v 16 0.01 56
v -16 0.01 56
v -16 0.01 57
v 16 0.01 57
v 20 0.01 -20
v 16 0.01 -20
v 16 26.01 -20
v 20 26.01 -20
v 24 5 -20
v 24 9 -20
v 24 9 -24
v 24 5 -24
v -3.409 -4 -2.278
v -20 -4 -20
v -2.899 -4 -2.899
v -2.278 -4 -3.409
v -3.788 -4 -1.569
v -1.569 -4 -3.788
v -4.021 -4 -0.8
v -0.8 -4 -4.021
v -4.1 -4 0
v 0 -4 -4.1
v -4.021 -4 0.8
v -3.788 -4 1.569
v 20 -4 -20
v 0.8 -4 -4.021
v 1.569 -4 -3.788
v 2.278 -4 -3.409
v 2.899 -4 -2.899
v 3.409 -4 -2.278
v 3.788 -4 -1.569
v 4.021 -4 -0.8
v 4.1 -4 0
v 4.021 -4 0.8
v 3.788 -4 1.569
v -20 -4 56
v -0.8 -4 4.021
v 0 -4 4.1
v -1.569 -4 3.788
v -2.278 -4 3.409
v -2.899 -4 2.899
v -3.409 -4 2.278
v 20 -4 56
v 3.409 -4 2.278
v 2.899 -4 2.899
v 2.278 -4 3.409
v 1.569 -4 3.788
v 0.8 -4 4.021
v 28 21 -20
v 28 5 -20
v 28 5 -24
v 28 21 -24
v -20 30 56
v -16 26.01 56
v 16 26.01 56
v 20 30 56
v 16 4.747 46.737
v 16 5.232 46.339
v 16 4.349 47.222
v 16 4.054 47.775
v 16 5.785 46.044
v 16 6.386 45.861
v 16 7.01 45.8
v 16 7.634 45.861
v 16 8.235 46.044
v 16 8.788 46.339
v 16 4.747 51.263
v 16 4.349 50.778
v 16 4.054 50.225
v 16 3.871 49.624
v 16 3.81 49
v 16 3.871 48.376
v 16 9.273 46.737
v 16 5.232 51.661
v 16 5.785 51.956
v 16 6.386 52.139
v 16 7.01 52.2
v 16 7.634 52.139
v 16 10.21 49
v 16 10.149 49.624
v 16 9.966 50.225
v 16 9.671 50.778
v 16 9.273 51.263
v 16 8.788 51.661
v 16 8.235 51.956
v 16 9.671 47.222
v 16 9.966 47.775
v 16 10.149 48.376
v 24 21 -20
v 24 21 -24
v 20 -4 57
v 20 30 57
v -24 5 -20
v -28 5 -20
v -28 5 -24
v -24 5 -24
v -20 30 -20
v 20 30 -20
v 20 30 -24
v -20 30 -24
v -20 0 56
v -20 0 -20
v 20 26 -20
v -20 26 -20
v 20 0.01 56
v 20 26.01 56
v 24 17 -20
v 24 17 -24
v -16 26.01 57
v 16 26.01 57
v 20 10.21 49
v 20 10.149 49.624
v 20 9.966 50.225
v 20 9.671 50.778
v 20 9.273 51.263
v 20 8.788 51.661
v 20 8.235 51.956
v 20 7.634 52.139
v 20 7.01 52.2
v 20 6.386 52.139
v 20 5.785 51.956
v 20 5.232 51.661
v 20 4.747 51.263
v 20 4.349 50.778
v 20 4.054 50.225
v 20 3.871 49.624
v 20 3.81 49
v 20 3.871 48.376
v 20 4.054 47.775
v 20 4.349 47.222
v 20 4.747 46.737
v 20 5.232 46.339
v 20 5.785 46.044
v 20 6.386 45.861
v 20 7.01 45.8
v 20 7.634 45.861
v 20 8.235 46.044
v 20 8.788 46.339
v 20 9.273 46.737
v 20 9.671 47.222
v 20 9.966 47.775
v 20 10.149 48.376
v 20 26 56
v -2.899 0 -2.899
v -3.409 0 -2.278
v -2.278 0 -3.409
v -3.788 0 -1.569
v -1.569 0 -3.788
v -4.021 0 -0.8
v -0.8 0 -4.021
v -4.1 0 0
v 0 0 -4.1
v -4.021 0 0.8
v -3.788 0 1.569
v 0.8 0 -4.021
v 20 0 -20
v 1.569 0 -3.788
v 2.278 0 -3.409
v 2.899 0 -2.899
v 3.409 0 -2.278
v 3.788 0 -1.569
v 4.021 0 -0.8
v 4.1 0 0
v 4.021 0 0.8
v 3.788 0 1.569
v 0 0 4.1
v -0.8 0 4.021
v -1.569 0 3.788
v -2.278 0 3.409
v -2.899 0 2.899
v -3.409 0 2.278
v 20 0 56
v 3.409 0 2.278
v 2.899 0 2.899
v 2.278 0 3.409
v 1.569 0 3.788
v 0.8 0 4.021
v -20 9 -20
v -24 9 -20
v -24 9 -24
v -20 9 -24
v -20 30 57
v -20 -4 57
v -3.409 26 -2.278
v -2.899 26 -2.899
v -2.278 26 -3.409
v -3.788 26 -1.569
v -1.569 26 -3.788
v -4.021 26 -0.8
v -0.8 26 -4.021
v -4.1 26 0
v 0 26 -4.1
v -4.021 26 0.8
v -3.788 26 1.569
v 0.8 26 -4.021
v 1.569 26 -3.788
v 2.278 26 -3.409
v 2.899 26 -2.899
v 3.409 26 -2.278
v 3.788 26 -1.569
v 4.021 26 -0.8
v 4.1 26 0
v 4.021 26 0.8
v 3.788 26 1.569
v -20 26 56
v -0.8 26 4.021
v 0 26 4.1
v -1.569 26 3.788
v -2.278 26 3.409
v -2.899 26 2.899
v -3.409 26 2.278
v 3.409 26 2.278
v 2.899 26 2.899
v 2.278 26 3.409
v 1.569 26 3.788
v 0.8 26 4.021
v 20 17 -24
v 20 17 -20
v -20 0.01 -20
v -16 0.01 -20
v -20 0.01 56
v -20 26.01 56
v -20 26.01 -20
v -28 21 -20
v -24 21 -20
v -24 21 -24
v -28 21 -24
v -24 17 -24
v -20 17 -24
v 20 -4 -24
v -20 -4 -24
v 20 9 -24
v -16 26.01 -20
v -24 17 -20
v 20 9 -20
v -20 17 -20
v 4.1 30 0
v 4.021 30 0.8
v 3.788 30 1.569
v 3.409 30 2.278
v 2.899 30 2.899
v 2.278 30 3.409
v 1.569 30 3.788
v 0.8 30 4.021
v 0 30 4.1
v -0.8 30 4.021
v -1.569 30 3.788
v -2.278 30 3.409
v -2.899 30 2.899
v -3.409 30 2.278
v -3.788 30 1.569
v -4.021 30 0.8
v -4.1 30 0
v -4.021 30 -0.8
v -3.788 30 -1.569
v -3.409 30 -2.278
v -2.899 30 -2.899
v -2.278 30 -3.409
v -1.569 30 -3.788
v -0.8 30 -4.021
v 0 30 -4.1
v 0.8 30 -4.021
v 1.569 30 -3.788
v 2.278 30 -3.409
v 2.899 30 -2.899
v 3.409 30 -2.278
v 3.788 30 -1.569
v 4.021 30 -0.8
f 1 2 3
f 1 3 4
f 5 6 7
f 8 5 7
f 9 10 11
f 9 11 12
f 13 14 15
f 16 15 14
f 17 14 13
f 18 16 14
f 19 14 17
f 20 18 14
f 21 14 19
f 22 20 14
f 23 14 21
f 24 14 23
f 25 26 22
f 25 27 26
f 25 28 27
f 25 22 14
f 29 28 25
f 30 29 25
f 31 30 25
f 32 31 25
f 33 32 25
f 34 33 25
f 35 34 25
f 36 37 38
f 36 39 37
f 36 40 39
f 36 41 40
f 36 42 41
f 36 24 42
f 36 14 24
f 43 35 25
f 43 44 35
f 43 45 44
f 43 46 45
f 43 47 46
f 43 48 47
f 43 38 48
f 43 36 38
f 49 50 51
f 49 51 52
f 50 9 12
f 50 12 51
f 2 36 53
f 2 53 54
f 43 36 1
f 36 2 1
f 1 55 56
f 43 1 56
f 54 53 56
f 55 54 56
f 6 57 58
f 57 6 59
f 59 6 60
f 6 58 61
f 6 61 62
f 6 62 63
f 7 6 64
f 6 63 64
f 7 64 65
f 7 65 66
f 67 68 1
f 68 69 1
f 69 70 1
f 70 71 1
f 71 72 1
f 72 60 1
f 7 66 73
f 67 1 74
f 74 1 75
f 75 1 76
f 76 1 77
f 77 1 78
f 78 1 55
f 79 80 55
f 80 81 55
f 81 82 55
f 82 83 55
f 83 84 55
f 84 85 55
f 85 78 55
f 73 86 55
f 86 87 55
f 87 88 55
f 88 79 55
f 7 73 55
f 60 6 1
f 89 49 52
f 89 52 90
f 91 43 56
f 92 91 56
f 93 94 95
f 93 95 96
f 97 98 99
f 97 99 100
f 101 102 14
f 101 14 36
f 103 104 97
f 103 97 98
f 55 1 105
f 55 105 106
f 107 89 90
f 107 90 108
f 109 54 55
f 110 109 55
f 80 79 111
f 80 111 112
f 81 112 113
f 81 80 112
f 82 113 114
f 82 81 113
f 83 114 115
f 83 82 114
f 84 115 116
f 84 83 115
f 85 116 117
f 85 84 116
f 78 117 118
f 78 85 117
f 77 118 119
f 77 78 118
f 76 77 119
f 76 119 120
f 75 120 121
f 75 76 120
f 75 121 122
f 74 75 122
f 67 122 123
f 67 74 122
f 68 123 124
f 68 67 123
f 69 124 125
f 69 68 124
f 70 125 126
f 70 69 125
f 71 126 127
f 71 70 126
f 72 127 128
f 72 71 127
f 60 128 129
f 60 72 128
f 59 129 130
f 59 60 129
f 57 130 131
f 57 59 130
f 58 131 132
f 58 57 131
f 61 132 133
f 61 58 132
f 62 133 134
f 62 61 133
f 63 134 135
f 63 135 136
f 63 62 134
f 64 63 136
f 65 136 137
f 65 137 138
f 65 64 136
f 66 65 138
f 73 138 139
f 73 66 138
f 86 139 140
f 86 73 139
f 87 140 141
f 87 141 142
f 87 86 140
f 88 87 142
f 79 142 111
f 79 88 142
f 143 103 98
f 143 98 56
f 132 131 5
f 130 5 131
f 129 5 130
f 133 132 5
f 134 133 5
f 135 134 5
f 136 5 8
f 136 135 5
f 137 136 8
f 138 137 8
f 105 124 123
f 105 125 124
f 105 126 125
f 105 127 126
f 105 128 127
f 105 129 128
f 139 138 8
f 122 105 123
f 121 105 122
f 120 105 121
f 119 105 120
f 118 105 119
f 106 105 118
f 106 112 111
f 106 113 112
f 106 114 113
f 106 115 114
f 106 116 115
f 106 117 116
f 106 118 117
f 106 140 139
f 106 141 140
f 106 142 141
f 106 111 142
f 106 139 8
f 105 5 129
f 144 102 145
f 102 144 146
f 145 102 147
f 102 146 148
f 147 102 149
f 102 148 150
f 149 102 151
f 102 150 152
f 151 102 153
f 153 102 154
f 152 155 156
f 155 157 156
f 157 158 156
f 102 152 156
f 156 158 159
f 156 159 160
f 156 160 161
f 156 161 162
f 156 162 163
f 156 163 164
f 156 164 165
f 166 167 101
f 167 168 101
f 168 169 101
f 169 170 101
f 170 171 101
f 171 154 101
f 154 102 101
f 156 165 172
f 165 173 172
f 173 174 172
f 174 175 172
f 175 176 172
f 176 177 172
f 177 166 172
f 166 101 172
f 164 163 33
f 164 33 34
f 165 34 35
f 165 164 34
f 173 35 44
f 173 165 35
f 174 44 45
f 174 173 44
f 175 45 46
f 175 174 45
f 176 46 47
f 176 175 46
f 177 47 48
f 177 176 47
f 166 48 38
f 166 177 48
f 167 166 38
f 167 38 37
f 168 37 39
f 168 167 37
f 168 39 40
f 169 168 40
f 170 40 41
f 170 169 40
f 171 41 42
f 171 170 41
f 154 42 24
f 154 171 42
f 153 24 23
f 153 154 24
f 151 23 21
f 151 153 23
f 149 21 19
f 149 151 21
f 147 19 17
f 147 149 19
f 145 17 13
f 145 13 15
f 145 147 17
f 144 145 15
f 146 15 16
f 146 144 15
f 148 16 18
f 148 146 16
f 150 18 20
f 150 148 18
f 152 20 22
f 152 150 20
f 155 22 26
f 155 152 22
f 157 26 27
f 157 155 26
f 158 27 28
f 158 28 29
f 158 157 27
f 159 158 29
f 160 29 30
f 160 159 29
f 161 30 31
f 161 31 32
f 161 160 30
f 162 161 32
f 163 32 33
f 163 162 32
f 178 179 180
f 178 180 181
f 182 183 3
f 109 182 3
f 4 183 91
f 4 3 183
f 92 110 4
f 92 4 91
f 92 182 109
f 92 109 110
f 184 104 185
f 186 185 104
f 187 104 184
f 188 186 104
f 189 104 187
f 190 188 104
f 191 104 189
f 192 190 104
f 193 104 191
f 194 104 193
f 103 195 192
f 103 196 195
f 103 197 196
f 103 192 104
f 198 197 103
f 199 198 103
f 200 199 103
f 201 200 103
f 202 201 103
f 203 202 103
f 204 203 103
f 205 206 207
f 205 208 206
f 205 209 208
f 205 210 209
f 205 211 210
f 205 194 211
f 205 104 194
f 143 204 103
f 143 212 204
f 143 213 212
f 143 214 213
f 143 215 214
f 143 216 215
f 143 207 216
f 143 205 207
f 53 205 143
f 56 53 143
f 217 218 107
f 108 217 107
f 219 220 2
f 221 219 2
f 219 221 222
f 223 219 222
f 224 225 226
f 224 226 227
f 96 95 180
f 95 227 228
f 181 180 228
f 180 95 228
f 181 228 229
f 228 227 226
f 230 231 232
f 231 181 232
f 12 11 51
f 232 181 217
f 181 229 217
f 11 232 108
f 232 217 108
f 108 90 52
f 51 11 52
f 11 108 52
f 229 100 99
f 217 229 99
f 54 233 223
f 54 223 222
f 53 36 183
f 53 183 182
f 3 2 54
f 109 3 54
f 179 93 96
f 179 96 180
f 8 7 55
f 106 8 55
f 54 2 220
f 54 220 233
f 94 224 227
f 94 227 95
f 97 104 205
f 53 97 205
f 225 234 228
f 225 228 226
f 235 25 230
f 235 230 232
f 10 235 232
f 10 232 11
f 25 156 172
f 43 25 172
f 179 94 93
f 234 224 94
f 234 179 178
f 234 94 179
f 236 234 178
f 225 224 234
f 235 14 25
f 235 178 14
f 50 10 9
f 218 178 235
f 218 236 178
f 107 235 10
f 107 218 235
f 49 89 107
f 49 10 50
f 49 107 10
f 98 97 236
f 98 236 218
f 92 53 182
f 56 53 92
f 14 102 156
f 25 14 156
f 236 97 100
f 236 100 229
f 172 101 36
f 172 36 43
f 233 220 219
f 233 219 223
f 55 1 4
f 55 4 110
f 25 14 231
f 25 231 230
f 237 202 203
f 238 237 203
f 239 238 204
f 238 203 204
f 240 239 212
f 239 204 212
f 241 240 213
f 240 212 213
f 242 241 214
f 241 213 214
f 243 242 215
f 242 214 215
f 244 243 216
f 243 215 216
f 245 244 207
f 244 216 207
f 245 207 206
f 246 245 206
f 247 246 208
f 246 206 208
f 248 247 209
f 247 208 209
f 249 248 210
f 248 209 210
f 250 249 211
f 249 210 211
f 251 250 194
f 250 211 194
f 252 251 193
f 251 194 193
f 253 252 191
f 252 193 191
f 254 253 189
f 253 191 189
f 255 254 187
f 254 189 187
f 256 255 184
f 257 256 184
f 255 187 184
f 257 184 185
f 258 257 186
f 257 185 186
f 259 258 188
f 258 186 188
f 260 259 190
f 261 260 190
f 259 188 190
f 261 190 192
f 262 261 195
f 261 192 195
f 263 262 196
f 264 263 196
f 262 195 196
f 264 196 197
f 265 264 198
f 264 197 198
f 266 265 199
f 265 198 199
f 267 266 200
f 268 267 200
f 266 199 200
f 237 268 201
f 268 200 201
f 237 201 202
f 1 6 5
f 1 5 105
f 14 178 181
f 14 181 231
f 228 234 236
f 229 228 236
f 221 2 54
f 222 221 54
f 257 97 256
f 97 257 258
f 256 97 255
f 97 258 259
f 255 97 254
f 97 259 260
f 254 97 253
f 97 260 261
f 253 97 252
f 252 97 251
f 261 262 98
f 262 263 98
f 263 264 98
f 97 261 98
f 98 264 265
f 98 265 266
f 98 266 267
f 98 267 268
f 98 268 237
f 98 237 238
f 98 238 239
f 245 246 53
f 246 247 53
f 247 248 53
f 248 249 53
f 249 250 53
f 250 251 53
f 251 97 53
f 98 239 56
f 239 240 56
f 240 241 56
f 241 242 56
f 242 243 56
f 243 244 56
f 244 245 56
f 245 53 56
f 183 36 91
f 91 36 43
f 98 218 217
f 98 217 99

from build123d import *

# Parameters (mm, degrees)
F0_W     = 40
F0_H     = 76
F0_R     = 4.1
F1_DEPTH = 4
F3_START = 16
F2_W     = 26
F2_H     = 76
F2_R     = 3.2
F3_DEPTH = 4
F4_START = -16
F4_DEPTH = 4
F5_START = -26
F5_DEPTH = 4
F7_START = -20
F6_W     = 4
F6_H     = 8
F7_DEPTH = 4
F9_START = 56
F8_W     = 40
F8_H     = 34
F8_W_2   = 32
F8_H_2   = 26
F9_DEPTH = 1


with BuildPart() as f1:
    # F0 (on Front) → F1 (new body)
    with BuildSketch(Plane.XZ):
        with Locations((0, 18)):
            Rectangle(F0_W, F0_H)
        Circle(F0_R, mode=Mode.SUBTRACT)
    extrude(amount=F1_DEPTH)


with BuildPart() as f3:
    # F2 (on Right) → F3 (new body)
    with BuildSketch(Plane.YZ.offset(F3_START)):
        with Locations((13.01, 18)):
            Rectangle(F2_W, F2_H)
        with Locations((7.01, 49)):
            Circle(F2_R, mode=Mode.SUBTRACT)
    extrude(amount=F3_DEPTH)


with BuildPart() as f4:
    # F2 (on Right) → F4 (new body)
    with BuildSketch(Plane.YZ.offset(F4_START)):
        with Locations((13.01, 18)):
            Rectangle(F2_W, F2_H)
        with Locations((7.01, 49)):
            Circle(F2_R, mode=Mode.SUBTRACT)
        with Locations((7.01, 49)):
            Circle(F2_R)
    extrude(amount=-F4_DEPTH)


with BuildPart() as f5:
    # F0 (on Front) → F5 (new body)
    with BuildSketch(Plane.XZ.offset(F5_START)):
        with Locations((0, 18)):
            Rectangle(F0_W, F0_H)
        Circle(F0_R, mode=Mode.SUBTRACT)
    extrude(amount=-F5_DEPTH)


with BuildPart() as f7:
    # F6 (on Top) → F7 (new body)
    with BuildSketch(Plane.XY.offset(F7_START)):
        Polygon((-20, 9), (-20, -4), (20, -4), (20, 9), (20, 17), (20, 30), (-20, 30), (-20, 17), align=None)
        with Locations((-22, 13)):
            Rectangle(F6_W, F6_H)
        with Locations((22, 13)):
            Rectangle(F6_W, F6_H)
        Polygon((-24, 5), (-24, 9), (-24, 17), (-24, 21), (-28, 21), (-28, 5), align=None)
        Polygon((24, 17), (24, 9), (24, 5), (28, 5), (28, 21), (24, 21), align=None)
    extrude(amount=-F7_DEPTH)


with BuildPart() as f9:
    # F8 (on Top) → F9 (new body)
    with BuildSketch(Plane.XY.offset(F9_START)):
        with Locations((0, 13)):
            Rectangle(F8_W, F8_H)
        with Locations((0, 13.01)):
            Rectangle(F8_W_2, F8_H_2, mode=Mode.SUBTRACT)
    extrude(amount=F9_DEPTH)


solid = Compound([f1.part, f3.part, f4.part, f5.part, f7.part, f9.part])
